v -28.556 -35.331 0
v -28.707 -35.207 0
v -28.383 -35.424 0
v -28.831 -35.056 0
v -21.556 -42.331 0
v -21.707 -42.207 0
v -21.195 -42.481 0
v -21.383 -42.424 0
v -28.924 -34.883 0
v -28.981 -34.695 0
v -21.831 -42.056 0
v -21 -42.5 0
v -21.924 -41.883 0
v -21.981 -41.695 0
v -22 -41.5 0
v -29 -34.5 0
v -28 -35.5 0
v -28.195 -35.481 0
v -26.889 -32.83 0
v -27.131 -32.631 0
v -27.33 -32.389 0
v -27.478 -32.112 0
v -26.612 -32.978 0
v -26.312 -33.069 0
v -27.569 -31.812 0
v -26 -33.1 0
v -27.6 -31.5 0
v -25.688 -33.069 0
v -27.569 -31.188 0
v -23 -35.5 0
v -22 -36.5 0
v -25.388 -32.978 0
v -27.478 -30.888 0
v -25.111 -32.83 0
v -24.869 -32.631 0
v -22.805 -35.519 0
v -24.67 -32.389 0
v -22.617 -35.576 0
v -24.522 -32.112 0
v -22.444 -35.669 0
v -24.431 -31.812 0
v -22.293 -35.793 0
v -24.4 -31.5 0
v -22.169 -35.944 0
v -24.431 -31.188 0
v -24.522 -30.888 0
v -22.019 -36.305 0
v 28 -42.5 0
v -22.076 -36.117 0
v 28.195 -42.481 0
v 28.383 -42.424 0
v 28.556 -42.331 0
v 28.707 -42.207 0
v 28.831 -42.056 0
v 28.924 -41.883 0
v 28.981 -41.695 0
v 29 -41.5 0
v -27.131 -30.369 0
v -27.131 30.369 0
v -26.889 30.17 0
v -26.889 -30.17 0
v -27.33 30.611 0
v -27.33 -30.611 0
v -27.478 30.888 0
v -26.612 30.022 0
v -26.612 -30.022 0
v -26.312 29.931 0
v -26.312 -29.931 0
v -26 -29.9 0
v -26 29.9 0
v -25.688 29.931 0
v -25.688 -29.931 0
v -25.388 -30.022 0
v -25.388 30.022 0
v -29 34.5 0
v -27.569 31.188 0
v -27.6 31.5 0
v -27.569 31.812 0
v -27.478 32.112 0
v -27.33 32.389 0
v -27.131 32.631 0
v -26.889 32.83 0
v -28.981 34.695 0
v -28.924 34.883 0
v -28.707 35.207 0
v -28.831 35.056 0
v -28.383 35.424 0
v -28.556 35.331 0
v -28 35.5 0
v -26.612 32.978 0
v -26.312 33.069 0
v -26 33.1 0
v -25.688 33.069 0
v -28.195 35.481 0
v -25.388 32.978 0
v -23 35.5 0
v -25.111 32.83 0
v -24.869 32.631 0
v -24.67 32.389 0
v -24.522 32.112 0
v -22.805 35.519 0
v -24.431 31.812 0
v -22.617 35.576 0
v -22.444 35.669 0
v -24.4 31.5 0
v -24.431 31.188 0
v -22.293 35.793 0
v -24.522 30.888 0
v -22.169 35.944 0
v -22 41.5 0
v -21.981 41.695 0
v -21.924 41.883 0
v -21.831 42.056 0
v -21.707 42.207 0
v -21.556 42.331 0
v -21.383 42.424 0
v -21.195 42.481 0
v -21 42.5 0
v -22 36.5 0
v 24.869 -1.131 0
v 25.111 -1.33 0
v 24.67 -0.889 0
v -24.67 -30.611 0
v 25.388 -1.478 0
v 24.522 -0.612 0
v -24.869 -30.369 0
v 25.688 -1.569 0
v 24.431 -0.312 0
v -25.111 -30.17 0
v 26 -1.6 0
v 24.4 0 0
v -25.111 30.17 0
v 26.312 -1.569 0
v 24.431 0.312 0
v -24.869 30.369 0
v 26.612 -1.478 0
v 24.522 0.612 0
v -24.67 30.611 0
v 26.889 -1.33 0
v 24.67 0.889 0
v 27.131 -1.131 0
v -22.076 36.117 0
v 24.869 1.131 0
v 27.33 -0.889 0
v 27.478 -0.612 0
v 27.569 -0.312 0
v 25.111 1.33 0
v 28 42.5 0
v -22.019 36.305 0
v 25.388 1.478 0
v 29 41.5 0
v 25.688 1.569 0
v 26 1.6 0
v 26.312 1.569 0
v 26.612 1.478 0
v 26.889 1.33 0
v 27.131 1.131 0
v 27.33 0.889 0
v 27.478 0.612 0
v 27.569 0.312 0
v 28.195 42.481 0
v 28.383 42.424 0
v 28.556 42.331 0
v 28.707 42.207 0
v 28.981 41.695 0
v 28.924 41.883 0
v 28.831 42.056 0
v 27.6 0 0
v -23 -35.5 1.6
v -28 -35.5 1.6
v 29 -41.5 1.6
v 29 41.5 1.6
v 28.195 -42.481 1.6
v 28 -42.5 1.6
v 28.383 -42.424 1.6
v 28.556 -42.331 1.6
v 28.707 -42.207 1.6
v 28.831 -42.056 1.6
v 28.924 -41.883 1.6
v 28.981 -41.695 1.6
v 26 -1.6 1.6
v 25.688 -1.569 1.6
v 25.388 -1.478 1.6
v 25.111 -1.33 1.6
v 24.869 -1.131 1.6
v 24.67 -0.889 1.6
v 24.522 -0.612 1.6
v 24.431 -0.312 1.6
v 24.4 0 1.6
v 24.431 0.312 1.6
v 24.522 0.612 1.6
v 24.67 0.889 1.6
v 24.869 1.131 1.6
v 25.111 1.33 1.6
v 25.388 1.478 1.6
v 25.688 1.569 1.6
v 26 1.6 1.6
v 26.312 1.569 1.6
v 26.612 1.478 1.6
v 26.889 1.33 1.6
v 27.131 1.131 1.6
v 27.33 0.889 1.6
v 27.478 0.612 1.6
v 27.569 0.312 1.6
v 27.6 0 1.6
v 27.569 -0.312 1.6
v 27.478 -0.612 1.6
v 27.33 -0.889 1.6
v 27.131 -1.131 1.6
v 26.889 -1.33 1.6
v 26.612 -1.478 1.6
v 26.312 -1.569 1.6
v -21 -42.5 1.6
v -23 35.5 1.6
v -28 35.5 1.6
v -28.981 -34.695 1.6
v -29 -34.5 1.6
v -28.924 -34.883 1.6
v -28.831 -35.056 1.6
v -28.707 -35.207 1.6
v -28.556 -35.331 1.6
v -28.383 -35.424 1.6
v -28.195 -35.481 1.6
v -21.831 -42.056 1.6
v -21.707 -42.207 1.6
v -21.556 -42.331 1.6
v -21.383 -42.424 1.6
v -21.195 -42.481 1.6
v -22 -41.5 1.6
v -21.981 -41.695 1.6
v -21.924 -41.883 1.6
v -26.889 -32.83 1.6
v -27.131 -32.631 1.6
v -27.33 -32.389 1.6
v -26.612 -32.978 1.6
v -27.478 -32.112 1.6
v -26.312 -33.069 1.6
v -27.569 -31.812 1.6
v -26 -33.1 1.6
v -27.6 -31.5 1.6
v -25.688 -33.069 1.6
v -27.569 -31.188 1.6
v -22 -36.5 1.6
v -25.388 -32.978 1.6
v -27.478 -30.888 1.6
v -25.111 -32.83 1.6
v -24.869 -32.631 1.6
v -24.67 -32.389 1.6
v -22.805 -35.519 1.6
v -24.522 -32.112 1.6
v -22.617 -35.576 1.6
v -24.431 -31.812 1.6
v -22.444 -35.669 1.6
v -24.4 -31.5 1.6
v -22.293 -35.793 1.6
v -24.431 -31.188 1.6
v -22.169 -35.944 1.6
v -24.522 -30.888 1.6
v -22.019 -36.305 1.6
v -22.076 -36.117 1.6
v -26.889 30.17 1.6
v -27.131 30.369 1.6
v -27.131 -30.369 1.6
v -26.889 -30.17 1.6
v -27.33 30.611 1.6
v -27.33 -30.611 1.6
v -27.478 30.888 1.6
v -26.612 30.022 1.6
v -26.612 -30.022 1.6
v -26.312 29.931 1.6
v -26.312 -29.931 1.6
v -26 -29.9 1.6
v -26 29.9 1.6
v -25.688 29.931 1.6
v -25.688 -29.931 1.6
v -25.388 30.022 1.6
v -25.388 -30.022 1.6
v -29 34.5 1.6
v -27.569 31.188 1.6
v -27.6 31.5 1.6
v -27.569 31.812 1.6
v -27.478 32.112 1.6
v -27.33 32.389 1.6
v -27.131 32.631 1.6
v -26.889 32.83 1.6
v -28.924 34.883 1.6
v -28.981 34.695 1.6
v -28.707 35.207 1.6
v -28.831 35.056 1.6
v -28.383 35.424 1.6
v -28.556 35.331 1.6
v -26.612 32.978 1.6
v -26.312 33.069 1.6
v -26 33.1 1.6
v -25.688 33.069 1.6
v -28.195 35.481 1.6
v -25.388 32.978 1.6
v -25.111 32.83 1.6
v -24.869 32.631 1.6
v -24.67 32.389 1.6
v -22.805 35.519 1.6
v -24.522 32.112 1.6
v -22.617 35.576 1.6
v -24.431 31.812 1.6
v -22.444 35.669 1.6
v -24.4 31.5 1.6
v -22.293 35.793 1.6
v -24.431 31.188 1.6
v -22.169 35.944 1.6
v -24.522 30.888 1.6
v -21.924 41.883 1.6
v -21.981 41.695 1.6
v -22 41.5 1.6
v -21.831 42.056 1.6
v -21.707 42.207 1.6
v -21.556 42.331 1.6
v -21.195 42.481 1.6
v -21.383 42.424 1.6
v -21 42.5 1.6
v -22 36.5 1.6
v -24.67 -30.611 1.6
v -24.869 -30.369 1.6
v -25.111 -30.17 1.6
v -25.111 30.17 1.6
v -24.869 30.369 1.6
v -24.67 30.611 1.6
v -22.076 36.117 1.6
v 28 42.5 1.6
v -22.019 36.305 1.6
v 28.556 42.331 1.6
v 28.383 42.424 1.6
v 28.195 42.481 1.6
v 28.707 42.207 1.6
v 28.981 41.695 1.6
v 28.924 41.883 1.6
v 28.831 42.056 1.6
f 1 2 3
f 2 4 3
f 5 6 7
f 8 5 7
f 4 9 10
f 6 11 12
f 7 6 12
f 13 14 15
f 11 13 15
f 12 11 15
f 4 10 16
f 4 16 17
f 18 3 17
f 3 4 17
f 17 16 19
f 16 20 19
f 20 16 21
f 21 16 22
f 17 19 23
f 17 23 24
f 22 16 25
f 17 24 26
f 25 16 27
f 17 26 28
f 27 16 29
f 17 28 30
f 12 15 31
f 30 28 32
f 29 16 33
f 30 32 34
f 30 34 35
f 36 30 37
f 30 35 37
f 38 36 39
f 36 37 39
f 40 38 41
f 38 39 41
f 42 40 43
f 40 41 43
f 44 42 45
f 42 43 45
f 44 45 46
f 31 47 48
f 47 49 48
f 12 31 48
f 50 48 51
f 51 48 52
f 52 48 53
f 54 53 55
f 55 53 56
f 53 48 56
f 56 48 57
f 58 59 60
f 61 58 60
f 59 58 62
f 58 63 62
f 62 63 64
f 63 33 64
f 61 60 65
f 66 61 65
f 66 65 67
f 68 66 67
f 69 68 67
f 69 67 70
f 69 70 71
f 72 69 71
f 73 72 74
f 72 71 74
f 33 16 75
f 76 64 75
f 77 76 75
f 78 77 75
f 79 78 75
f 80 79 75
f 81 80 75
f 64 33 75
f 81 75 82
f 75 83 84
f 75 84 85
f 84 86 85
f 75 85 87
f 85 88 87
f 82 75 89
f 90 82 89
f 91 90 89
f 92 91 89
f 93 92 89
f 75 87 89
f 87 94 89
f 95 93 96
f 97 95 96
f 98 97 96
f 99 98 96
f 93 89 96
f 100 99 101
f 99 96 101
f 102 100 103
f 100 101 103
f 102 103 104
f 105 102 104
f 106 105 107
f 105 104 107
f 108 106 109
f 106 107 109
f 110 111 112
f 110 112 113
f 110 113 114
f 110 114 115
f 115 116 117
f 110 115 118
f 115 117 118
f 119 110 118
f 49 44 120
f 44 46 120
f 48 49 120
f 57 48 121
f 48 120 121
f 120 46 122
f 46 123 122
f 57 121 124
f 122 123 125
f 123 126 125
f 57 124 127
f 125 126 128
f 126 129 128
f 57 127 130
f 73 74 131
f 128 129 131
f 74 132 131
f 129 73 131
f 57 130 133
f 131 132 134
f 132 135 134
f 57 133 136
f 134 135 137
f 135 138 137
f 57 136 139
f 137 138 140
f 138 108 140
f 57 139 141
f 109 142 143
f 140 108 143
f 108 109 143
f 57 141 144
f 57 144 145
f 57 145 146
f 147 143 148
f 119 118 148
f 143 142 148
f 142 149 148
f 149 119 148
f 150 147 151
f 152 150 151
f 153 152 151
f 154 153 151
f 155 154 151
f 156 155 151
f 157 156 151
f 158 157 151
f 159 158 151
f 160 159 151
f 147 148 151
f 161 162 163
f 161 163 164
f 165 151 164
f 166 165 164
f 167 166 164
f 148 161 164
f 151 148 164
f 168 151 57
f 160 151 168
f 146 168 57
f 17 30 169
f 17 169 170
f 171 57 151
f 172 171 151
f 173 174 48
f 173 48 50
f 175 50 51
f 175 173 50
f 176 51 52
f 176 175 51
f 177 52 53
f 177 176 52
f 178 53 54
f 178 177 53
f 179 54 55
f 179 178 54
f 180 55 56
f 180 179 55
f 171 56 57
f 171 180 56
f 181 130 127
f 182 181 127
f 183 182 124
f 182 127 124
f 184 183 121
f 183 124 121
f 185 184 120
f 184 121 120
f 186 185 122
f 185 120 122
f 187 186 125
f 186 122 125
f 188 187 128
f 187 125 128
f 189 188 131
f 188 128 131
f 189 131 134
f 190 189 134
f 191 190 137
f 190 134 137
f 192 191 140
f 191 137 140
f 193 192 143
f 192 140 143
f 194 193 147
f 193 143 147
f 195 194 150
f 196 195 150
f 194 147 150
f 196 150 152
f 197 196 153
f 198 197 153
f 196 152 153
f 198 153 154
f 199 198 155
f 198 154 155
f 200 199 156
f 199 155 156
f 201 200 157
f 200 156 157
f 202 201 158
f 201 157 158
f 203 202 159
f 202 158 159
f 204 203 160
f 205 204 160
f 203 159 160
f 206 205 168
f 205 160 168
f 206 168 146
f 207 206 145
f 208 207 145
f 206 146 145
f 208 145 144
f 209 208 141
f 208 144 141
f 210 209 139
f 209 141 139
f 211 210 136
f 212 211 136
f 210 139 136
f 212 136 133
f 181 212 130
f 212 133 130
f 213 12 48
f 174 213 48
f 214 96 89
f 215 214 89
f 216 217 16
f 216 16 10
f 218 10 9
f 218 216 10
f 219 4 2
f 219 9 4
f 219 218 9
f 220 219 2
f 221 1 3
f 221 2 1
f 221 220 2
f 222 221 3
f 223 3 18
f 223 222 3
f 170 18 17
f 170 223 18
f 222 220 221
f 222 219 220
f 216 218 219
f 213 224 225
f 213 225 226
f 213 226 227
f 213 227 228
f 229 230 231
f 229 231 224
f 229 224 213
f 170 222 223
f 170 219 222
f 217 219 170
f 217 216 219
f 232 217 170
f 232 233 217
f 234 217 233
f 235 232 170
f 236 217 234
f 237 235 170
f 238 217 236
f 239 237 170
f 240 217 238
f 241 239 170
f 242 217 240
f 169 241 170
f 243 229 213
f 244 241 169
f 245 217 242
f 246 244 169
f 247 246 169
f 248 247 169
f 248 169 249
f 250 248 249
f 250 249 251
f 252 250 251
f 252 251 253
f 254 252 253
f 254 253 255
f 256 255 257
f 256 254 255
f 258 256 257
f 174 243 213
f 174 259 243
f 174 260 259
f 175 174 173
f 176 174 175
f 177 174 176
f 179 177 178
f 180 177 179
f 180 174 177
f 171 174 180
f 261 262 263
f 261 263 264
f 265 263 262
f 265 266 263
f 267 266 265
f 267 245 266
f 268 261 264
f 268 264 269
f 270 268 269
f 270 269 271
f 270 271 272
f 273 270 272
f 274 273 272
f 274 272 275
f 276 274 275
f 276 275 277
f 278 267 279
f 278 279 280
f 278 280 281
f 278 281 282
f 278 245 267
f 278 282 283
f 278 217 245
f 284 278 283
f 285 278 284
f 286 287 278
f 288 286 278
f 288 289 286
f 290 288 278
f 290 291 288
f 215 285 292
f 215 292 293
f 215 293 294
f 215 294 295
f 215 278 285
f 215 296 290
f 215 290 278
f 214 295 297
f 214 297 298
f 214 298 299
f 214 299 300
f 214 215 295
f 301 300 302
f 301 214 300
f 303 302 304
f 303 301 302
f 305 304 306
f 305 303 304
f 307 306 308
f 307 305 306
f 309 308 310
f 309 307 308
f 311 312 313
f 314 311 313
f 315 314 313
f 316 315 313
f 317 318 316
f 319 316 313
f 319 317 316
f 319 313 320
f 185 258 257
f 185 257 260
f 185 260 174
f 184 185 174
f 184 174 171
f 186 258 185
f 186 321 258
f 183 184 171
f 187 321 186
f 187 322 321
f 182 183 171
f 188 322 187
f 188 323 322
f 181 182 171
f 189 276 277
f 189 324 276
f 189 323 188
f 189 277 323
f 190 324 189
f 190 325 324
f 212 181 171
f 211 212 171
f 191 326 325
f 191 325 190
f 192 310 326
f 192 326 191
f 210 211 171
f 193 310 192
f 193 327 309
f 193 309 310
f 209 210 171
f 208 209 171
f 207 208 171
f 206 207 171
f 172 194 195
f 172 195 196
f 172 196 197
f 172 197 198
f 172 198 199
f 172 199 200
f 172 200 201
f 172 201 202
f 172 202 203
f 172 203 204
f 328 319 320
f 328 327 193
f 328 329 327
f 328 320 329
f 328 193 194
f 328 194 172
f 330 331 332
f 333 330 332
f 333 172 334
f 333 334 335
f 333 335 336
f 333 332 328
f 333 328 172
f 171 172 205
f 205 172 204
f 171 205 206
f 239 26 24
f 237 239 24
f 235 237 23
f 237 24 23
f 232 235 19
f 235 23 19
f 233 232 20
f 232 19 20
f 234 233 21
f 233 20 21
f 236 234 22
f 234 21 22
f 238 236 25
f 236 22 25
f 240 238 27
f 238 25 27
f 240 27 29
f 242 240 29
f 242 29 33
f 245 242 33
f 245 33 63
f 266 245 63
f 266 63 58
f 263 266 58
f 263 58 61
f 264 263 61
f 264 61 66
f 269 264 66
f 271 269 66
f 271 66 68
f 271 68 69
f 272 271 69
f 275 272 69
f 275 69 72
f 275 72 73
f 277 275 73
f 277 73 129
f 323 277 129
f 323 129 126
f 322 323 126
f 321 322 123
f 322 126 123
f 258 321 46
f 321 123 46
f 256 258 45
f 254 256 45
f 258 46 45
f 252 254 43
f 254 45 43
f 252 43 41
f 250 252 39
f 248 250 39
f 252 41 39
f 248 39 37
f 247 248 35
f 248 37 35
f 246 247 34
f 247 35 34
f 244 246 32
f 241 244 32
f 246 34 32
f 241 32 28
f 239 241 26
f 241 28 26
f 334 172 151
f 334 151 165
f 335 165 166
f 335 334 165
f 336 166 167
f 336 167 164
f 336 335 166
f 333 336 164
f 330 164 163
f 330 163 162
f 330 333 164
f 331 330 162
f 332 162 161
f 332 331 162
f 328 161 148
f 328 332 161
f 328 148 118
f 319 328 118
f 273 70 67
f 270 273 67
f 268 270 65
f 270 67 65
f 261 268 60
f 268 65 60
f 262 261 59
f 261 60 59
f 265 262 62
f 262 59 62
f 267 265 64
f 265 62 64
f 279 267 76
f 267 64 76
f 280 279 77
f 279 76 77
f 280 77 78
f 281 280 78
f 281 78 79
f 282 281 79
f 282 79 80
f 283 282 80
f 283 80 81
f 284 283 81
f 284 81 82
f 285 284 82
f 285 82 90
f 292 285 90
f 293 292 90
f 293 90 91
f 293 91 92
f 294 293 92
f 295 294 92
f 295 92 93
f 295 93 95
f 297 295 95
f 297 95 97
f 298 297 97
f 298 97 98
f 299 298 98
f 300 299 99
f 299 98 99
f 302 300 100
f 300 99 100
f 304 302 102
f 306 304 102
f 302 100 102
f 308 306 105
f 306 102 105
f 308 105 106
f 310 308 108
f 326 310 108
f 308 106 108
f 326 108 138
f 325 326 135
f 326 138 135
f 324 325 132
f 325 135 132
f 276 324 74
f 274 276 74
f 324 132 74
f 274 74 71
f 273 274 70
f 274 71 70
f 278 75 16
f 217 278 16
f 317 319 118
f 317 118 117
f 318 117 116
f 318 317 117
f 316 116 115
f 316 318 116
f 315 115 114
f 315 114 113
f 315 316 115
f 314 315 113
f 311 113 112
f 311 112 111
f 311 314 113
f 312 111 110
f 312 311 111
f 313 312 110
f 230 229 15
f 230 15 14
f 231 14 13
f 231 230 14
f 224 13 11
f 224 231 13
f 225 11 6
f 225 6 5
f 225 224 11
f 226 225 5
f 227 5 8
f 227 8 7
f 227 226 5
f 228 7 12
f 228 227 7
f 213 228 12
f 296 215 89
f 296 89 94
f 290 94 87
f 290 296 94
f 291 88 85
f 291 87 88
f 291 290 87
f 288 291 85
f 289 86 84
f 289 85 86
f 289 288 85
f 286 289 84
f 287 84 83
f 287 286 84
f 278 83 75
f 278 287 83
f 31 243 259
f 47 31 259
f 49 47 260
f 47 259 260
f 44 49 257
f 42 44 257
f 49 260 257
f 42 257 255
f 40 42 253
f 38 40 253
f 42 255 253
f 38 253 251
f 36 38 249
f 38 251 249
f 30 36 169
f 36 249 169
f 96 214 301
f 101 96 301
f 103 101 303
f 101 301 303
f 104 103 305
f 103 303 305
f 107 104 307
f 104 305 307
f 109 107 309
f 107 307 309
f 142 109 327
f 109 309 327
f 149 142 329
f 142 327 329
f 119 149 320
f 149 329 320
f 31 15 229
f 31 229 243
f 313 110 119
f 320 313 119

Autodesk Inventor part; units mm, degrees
ref_plane "YZ Plane" through (0, 0, 0) normal (1, 0, 0) x (0, 1, 0)
ref_plane "XZ Plane" through (0, 0, 0) normal (0, 1, 0) x (-1, 0, 0)
ref_plane "XY Plane" through (0, 0, 0) normal (0, 0, 1) x (1, 0, 0)
sketch "Skizze1" plane through (0, 0, 0) normal (0, 0, 1) x (1, 0, 0)
  line L0 (-22, -42.5) -> (29, -42.5)
  line L1 (29, -42.5) -> (29, 42.5)
  line L2 (29, 42.5) -> (-22, 42.5)
  line L3 (-29, 35.5) -> (-29, -35.5)
  line L4 (-22, -42.5) -> (-22, -35.5)
  line L5 (-22, -35.5) -> (-29, -35.5)
  line L6 (-22, 42.5) -> (-22, 35.5)
  line L7 (-22, 35.5) -> (-29, 35.5)
  line L8 (0, 59.5) -> (0, -59.5) projected
  line L9 (-40.6, 0) -> (40.6, 0) projected
  dimension "d22" = 58
  dimension "d23" = 85
  dimension "d24" = 7
  dimension "d25" = 7
  dimension "d26" = 7
  dimension "d27" = 7
extrude "Extrusion1" add sketch "Skizze1" along normal blind 1.6
sketch "Skizze2" plane through (0, 0, 1.6) normal (0, 0, 1) x (1, 0, 0)
  line L0 (-22, -42.5) -> (29, -42.5) projected
  line L1 (29, -42.5) -> (29, 42.5) projected
  line L2 (29, 42.5) -> (-22, 42.5) projected
  line L3 (-29, 35.5) -> (-29, -35.5) projected
  line L4 (-22, 42.5) -> (-22, 35.5) projected
  line L5 (-22, 35.5) -> (-29, 35.5) projected
  line L6 (-29, -35.5) -> (-22, -35.5) projected
  line L7 (-22, -35.5) -> (-22, -42.5) projected
  line L8 (-40.6, 0) -> (40.6, 0) projected
  point P0 (0, 0)
  point P1 (-26, 31.5)
  point P2 (-26, -31.5)
  point P3 (26, 0)
  dimension "d28" = 55
  dimension "d29" = 11
  dimension "d30" = 3
  dimension "d31" = 3
  dimension "d32" = 11
hole "Bohrung1" at (-26, 31.5, 1.6) at (-26, -31.5, 1.6) at (26, 0, 1.6) direction (0, 0, -1) diameter 3.2 end through all
fillet "Rundung1" radius 1 8 edges at (29, -42.5, 0.8) (29, 42.5, 0.8) (-22, -35.5, 0.8) (-22, -42.5, 0.8) (-29, -35.5, 0.8) (-29, 35.5, 0.8) (-22, 35.5, 0.8) (-22, 42.5, 0.8)
equation "\"d26\" = d24"
equation "\"d27\" = d25"
properties part number "Base Station PCB" material "Phenolharz"
